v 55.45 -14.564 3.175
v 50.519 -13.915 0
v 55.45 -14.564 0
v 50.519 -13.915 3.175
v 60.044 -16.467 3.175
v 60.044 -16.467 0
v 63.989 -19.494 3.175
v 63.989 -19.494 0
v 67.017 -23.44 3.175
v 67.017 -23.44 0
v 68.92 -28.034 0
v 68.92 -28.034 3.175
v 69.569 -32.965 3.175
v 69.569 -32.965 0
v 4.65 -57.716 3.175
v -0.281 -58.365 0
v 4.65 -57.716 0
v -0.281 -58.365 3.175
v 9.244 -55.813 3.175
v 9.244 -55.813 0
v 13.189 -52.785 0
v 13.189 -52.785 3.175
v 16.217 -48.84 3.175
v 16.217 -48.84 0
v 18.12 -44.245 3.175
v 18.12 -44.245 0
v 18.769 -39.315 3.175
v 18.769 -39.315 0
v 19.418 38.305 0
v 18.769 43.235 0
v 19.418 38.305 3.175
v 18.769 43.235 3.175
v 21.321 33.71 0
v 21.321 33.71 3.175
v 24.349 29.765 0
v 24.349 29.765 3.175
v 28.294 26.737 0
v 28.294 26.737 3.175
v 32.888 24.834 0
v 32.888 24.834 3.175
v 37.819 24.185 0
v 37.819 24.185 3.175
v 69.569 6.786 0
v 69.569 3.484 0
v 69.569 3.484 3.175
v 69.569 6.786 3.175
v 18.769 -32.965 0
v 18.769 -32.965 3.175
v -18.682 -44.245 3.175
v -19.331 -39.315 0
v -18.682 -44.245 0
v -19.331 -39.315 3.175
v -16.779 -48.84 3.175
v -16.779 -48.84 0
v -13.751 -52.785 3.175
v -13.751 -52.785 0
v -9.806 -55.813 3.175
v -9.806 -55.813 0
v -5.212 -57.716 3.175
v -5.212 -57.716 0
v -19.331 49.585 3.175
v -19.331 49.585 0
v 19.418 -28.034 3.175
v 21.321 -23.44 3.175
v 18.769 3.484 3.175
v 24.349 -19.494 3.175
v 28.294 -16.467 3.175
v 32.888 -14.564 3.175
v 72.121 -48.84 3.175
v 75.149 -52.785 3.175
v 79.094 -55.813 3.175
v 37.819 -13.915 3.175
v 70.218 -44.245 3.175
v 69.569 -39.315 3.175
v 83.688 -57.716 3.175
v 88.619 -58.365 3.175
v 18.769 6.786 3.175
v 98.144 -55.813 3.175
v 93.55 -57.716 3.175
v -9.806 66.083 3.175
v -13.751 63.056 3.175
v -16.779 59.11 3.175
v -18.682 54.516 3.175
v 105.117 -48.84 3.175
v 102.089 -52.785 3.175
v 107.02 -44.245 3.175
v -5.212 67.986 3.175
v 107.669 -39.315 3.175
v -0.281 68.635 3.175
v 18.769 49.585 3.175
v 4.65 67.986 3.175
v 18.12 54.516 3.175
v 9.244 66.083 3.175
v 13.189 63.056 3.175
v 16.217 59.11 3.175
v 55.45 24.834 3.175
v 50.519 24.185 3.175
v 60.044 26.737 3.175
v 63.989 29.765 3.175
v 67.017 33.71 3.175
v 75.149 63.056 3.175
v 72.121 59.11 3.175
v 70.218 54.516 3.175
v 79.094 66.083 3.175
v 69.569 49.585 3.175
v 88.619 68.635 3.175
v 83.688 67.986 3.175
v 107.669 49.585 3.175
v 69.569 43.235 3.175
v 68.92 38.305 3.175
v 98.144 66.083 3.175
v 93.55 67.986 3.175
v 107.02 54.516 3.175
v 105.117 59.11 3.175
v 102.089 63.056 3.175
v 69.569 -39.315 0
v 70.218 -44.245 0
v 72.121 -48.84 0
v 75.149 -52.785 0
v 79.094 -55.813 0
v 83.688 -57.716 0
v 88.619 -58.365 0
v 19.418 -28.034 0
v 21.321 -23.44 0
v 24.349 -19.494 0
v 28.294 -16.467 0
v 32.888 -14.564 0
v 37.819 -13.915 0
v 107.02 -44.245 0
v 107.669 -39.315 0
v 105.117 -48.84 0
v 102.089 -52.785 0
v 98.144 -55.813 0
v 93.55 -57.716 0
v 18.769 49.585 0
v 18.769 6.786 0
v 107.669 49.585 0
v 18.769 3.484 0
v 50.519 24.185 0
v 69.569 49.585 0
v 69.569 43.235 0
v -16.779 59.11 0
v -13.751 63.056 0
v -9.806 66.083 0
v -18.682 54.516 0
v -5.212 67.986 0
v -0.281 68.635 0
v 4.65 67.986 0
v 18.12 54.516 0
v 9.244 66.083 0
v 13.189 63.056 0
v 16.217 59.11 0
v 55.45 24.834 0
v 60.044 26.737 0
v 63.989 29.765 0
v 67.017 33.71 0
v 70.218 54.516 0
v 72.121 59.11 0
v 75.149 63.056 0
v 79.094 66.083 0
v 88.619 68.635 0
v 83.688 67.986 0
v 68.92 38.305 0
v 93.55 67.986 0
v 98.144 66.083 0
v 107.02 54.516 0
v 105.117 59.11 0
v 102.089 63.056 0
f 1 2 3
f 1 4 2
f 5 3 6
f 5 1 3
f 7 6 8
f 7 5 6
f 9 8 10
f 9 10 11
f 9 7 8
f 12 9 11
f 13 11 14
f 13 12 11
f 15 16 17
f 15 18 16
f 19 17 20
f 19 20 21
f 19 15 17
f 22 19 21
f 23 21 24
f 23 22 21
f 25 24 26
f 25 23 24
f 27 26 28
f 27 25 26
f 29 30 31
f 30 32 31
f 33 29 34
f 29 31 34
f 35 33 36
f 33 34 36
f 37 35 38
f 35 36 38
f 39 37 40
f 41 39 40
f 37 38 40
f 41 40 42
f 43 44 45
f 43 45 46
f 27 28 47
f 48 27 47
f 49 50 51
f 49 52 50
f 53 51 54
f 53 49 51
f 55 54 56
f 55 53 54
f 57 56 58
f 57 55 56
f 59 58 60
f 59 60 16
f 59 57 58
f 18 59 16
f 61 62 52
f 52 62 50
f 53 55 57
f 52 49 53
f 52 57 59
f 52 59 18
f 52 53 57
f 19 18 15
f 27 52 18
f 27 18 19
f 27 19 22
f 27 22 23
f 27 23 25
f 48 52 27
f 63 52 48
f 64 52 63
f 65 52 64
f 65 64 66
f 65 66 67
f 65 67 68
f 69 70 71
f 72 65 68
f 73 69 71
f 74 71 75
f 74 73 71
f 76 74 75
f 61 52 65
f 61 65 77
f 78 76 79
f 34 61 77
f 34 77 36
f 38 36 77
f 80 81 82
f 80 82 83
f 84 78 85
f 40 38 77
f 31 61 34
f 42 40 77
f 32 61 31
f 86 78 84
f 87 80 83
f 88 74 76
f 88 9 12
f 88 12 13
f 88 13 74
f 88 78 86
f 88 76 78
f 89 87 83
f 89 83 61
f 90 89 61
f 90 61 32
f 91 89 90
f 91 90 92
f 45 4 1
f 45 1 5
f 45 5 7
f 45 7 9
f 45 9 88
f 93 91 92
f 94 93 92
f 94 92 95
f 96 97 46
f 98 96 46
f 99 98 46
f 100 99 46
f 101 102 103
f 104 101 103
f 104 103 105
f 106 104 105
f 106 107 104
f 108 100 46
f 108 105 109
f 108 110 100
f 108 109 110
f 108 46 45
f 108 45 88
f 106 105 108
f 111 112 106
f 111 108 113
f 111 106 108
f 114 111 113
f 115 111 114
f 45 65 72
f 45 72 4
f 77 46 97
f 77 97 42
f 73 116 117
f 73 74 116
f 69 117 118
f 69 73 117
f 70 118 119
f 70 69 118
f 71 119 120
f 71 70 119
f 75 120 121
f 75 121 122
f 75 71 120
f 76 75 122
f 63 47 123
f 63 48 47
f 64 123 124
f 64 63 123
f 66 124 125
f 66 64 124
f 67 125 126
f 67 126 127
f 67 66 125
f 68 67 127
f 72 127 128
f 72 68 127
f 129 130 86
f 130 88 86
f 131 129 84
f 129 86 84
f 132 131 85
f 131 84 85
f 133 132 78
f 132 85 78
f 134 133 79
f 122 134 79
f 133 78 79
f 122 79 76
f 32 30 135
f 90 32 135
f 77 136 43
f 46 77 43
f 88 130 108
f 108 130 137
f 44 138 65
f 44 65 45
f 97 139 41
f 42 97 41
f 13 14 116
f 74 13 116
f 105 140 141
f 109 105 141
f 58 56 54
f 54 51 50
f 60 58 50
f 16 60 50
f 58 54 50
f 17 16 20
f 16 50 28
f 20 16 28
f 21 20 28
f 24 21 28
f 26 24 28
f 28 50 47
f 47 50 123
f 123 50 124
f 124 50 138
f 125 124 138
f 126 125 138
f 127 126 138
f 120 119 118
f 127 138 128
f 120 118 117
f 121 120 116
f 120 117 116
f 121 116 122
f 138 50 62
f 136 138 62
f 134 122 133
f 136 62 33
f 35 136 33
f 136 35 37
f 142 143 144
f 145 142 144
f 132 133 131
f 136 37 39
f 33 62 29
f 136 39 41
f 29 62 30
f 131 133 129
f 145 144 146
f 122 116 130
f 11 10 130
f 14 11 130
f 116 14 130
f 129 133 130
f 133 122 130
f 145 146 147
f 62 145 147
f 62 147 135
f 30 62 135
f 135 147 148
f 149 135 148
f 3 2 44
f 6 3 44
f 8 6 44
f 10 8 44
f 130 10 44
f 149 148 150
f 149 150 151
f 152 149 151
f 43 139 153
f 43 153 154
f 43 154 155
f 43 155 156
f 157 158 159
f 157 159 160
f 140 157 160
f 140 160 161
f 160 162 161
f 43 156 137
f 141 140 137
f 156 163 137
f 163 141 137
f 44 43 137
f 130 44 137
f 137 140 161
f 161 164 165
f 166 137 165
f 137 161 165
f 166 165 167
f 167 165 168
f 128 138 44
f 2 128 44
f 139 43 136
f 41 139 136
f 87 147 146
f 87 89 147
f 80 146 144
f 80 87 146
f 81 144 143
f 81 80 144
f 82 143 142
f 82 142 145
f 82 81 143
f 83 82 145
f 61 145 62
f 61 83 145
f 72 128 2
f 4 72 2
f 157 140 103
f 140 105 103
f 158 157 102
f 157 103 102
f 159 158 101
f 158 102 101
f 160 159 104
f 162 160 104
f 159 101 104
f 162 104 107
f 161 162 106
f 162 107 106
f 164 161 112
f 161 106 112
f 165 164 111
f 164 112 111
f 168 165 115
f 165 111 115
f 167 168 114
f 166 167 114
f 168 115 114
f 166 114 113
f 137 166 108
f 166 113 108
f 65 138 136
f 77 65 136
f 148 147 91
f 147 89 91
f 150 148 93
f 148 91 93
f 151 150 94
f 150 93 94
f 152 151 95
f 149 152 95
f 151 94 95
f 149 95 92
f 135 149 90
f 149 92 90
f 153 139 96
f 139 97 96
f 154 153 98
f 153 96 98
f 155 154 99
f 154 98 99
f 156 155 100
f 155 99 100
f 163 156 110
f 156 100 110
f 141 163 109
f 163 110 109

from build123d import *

# Parameters (mm, degrees)
F0_W     = 50.8
F0_H     = 3.302
F1_DEPTH = 3.175
F2_R     = 19.04999


# Not quite as in the source:
# - a fillet or chamfer is up to 0.001 mm smaller than in the source, because OpenCascade refuses the exact size


with BuildPart() as f1:
    # F0 (on Top) → F1 (new body)
    with BuildSketch(Plane.XY):
        Polygon((18.769003178, 68.6352171788), (-19.330996822, 68.6352171788), (-19.330996822, -58.3647828212), (18.769003178, -58.3647828212), (18.769003178, -13.9147828212), (69.569003178, -13.9147828212), (69.569003178, -58.3647828212), (107.669003178, -58.3647828212), (107.669003178, 68.6352171788), (69.569003178, 68.6352171788), (69.569003178, 24.1852171788), (18.769003178, 24.1852171788), align=None)
        with Locations((44.169003178, 5.1352171788)):
            Rectangle(F0_W, F0_H, mode=Mode.SUBTRACT)
    extrude(amount=F1_DEPTH)

    # F2 (radius 19.05 in the source; OpenCascade refuses exactly that, so slightly less here)
    f2_edges = [f1.edges().sort_by_distance(p)[0] for p in [
        (18.769003, -58.364783, 1.5875),
        (-19.330997, -58.364783, 1.5875),
        (69.569003, -58.364783, 1.5875),
        (107.669003, -58.364783, 1.5875),
        (18.769003, -13.914783, 1.5875),
        (69.569003, -13.914783, 1.5875),
        (-19.330997, 68.635217, 1.5875),
        (18.769003, 68.635217, 1.5875),
        (69.569003, 24.185217, 1.5875),
        (69.569003, 68.635217, 1.5875),
        (107.669003, 68.635217, 1.5875),
        (18.769003, 24.185217, 1.5875),
    ]]
    fillet(f2_edges, radius=F2_R)


solid = f1.part
